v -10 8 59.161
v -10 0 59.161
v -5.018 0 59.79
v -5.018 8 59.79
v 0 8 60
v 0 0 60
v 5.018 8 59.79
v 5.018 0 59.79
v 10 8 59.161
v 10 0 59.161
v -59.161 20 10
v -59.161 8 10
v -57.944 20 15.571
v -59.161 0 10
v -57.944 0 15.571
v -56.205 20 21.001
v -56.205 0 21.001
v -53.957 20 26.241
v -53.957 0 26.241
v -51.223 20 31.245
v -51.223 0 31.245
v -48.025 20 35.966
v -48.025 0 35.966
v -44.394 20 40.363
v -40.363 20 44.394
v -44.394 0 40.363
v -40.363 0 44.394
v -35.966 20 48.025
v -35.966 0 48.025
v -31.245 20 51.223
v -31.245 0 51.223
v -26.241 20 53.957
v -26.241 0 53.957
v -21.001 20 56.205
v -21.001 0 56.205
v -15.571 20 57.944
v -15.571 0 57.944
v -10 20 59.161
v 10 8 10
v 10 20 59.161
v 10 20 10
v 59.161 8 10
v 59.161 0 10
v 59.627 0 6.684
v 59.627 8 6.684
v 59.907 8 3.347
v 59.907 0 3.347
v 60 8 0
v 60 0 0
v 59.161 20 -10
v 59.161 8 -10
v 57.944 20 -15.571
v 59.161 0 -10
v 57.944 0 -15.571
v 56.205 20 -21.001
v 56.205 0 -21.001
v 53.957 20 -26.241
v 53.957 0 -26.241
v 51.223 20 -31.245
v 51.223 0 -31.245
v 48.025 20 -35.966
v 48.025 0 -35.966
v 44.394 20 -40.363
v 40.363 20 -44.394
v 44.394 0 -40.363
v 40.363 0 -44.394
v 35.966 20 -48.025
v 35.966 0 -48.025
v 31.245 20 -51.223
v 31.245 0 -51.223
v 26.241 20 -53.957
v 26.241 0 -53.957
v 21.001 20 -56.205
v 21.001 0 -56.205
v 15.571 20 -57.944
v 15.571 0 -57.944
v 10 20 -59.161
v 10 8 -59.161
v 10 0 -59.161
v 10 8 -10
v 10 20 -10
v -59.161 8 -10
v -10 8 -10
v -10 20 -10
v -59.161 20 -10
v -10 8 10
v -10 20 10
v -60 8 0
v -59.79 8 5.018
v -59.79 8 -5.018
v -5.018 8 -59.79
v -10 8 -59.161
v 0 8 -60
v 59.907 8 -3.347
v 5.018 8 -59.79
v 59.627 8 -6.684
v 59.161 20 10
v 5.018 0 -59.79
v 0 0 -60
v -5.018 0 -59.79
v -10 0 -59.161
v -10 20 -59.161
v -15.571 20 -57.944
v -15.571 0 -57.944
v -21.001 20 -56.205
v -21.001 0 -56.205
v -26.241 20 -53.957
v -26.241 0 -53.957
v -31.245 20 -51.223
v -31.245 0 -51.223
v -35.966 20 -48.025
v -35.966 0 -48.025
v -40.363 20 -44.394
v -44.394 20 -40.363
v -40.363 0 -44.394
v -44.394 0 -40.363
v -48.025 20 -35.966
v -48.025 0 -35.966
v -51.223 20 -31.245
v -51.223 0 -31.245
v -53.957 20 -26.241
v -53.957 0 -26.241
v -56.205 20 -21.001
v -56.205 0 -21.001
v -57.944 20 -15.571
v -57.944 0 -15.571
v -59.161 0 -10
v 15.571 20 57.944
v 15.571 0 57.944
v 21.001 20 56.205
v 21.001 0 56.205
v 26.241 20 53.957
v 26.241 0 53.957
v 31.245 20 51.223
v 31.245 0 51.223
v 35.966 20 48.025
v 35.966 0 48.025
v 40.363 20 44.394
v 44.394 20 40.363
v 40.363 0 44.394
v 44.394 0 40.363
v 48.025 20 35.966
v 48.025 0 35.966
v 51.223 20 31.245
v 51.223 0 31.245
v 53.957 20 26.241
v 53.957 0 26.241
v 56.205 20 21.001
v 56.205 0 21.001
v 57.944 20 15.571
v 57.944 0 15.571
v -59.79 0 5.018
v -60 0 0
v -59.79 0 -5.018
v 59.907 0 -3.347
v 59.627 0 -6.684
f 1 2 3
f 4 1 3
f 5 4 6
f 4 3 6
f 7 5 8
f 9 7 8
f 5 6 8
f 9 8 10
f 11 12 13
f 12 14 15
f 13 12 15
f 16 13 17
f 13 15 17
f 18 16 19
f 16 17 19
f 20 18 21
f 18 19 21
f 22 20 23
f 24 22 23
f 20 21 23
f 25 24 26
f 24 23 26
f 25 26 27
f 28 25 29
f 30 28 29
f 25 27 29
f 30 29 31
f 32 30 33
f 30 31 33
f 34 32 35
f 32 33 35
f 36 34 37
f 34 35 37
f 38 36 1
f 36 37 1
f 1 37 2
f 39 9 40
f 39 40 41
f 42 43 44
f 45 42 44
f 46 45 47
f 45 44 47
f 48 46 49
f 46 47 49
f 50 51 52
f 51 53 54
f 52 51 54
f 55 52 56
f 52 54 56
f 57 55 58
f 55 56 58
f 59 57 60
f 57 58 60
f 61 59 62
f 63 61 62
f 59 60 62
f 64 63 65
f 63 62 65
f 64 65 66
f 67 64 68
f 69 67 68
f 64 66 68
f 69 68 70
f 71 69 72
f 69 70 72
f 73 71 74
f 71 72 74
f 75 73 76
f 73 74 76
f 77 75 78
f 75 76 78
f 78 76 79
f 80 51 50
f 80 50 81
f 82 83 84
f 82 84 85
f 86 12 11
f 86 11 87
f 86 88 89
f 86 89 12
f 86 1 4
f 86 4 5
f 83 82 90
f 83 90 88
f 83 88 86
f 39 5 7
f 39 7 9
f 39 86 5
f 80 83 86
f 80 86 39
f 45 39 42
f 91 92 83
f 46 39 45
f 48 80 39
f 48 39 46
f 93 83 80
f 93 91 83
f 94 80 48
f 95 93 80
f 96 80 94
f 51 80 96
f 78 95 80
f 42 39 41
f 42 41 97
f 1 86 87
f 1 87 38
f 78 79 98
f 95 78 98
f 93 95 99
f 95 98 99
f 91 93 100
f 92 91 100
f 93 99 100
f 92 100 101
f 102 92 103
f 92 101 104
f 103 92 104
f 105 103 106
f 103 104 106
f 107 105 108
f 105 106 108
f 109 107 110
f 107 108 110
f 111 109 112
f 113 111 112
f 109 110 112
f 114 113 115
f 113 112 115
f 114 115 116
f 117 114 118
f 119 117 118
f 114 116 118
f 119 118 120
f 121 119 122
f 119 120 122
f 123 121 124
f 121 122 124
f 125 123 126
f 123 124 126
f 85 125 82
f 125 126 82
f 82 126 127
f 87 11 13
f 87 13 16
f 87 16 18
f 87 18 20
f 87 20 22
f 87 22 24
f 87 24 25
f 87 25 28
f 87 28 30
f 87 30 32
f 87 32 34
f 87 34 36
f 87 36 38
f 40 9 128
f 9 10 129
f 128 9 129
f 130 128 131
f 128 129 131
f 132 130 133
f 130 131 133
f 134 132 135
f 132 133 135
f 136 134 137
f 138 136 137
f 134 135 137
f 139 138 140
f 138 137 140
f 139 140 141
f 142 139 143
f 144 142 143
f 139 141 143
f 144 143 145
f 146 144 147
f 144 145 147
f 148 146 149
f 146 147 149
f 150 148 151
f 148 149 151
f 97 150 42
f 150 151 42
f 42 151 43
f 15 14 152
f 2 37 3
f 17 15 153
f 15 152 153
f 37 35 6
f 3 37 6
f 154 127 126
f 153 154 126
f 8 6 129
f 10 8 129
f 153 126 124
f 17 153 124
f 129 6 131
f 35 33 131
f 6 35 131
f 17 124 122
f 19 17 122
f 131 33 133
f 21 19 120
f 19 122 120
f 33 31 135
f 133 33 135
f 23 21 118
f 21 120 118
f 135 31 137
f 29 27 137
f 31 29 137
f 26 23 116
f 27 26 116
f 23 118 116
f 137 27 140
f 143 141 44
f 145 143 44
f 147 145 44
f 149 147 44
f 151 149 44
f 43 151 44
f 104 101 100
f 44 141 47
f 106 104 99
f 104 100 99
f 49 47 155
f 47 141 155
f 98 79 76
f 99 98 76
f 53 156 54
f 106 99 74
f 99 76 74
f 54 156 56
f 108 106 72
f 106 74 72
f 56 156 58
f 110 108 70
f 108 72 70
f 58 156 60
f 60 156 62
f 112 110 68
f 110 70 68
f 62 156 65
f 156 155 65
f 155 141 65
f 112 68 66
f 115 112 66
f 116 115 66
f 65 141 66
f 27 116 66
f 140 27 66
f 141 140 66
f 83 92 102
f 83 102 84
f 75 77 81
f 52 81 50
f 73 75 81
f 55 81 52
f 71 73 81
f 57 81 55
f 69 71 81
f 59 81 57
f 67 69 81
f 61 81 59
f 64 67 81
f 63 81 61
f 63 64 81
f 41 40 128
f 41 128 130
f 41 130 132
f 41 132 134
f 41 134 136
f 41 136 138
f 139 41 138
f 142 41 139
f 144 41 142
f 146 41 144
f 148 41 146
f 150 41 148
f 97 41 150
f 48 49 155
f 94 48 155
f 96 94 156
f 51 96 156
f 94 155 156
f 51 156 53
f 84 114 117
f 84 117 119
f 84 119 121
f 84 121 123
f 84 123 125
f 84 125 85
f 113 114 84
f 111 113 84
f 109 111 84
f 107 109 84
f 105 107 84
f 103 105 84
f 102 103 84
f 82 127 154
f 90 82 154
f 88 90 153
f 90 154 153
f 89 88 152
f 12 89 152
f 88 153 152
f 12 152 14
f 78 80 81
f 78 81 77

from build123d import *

# Parameters (mm, degrees)
BOSS_EXTRUDE1_DEPTH = 20
CUT_EXTRUDE1_START  = 8
CUT_EXTRUDE1_DEPTH  = 12


with BuildPart() as part:
    # Sketch1 → Boss-Extrude1 (new body)
    with BuildSketch(Plane(origin=(0, 0, 0), x_dir=(1, 0, 0), z_dir=(0, 1, 0))):
        with BuildLine():
            Line((-59.160797831, 10), (-10, 10))
            Line((-10, 10), (-10, 59.160797831))
            ThreePointArc((-10, 59.160797831), (-42.426406871, 42.426406871), (-59.160797831, 10))
        make_face()
        with BuildLine():
            Line((-10, 59.160797831), (-10, 10))
            Line((-10, 10), (-59.160797831, 10))
            ThreePointArc((-59.160797831, 10), (-60, 0), (-59.160797831, -10))
            Line((-59.160797831, -10), (-10, -10))
            Line((-10, -10), (-10, -59.160797831))
            ThreePointArc((-10, -59.160797831), (0, -60), (10, -59.160797831))
            Line((10, -59.160797831), (10, -10))
            Line((10, -10), (59.160797831, -10))
            ThreePointArc((59.160797831, -10), (59.789831367, -5.017575617), (60, 0))
            ThreePointArc((60, 0), (59.789831367, 5.017575617), (59.160797831, 10))
            Line((59.160797831, 10), (10, 10))
            Line((10, 10), (10, 59.160797831))
            ThreePointArc((10, 59.160797831), (0, 60), (-10, 59.160797831))
        make_face()
        with BuildLine():
            Line((-10, -10), (-59.160797831, -10))
            ThreePointArc((-59.160797831, -10), (-42.426406871, -42.426406871), (-10, -59.160797831))
            Line((-10, -59.160797831), (-10, -10))
        make_face()
        with BuildLine():
            ThreePointArc((59.160797831, 10), (42.426406871, 42.426406871), (10, 59.160797831))
            Line((10, 59.160797831), (10, 10))
            Line((10, 10), (59.160797831, 10))
        make_face()
        with BuildLine():
            Line((10, -10), (10, -59.160797831))
            ThreePointArc((10, -59.160797831), (42.426406871, -42.426406871), (59.160797831, -10))
            Line((59.160797831, -10), (10, -10))
        make_face()
    extrude(amount=BOSS_EXTRUDE1_DEPTH)

    # Sketch1<3> → Cut-Extrude1 (cut)
    with BuildSketch(Plane(origin=(0, 0, 0), x_dir=(1, 0, 0), z_dir=(0, 1, 0)).offset(CUT_EXTRUDE1_START)):
        with BuildLine():
            Line((-10, 59.160797831), (-10, 10))
            Line((-10, 10), (-59.160797831, 10))
            ThreePointArc((-59.160797831, 10), (-60, 0), (-59.160797831, -10))
            Line((-59.160797831, -10), (-10, -10))
            Line((-10, -10), (-10, -59.160797831))
            ThreePointArc((-10, -59.160797831), (0, -60), (10, -59.160797831))
            Line((10, -59.160797831), (10, -10))
            Line((10, -10), (59.160797831, -10))
            ThreePointArc((59.160797831, -10), (59.789831367, -5.017575617), (60, 0))
            ThreePointArc((60, 0), (59.789831367, 5.017575617), (59.160797831, 10))
            Line((59.160797831, 10), (10, 10))
            Line((10, 10), (10, 59.160797831))
            ThreePointArc((10, 59.160797831), (0, 60), (-10, 59.160797831))
        make_face()
    extrude(amount=CUT_EXTRUDE1_DEPTH, mode=Mode.SUBTRACT)


solid = part.part
